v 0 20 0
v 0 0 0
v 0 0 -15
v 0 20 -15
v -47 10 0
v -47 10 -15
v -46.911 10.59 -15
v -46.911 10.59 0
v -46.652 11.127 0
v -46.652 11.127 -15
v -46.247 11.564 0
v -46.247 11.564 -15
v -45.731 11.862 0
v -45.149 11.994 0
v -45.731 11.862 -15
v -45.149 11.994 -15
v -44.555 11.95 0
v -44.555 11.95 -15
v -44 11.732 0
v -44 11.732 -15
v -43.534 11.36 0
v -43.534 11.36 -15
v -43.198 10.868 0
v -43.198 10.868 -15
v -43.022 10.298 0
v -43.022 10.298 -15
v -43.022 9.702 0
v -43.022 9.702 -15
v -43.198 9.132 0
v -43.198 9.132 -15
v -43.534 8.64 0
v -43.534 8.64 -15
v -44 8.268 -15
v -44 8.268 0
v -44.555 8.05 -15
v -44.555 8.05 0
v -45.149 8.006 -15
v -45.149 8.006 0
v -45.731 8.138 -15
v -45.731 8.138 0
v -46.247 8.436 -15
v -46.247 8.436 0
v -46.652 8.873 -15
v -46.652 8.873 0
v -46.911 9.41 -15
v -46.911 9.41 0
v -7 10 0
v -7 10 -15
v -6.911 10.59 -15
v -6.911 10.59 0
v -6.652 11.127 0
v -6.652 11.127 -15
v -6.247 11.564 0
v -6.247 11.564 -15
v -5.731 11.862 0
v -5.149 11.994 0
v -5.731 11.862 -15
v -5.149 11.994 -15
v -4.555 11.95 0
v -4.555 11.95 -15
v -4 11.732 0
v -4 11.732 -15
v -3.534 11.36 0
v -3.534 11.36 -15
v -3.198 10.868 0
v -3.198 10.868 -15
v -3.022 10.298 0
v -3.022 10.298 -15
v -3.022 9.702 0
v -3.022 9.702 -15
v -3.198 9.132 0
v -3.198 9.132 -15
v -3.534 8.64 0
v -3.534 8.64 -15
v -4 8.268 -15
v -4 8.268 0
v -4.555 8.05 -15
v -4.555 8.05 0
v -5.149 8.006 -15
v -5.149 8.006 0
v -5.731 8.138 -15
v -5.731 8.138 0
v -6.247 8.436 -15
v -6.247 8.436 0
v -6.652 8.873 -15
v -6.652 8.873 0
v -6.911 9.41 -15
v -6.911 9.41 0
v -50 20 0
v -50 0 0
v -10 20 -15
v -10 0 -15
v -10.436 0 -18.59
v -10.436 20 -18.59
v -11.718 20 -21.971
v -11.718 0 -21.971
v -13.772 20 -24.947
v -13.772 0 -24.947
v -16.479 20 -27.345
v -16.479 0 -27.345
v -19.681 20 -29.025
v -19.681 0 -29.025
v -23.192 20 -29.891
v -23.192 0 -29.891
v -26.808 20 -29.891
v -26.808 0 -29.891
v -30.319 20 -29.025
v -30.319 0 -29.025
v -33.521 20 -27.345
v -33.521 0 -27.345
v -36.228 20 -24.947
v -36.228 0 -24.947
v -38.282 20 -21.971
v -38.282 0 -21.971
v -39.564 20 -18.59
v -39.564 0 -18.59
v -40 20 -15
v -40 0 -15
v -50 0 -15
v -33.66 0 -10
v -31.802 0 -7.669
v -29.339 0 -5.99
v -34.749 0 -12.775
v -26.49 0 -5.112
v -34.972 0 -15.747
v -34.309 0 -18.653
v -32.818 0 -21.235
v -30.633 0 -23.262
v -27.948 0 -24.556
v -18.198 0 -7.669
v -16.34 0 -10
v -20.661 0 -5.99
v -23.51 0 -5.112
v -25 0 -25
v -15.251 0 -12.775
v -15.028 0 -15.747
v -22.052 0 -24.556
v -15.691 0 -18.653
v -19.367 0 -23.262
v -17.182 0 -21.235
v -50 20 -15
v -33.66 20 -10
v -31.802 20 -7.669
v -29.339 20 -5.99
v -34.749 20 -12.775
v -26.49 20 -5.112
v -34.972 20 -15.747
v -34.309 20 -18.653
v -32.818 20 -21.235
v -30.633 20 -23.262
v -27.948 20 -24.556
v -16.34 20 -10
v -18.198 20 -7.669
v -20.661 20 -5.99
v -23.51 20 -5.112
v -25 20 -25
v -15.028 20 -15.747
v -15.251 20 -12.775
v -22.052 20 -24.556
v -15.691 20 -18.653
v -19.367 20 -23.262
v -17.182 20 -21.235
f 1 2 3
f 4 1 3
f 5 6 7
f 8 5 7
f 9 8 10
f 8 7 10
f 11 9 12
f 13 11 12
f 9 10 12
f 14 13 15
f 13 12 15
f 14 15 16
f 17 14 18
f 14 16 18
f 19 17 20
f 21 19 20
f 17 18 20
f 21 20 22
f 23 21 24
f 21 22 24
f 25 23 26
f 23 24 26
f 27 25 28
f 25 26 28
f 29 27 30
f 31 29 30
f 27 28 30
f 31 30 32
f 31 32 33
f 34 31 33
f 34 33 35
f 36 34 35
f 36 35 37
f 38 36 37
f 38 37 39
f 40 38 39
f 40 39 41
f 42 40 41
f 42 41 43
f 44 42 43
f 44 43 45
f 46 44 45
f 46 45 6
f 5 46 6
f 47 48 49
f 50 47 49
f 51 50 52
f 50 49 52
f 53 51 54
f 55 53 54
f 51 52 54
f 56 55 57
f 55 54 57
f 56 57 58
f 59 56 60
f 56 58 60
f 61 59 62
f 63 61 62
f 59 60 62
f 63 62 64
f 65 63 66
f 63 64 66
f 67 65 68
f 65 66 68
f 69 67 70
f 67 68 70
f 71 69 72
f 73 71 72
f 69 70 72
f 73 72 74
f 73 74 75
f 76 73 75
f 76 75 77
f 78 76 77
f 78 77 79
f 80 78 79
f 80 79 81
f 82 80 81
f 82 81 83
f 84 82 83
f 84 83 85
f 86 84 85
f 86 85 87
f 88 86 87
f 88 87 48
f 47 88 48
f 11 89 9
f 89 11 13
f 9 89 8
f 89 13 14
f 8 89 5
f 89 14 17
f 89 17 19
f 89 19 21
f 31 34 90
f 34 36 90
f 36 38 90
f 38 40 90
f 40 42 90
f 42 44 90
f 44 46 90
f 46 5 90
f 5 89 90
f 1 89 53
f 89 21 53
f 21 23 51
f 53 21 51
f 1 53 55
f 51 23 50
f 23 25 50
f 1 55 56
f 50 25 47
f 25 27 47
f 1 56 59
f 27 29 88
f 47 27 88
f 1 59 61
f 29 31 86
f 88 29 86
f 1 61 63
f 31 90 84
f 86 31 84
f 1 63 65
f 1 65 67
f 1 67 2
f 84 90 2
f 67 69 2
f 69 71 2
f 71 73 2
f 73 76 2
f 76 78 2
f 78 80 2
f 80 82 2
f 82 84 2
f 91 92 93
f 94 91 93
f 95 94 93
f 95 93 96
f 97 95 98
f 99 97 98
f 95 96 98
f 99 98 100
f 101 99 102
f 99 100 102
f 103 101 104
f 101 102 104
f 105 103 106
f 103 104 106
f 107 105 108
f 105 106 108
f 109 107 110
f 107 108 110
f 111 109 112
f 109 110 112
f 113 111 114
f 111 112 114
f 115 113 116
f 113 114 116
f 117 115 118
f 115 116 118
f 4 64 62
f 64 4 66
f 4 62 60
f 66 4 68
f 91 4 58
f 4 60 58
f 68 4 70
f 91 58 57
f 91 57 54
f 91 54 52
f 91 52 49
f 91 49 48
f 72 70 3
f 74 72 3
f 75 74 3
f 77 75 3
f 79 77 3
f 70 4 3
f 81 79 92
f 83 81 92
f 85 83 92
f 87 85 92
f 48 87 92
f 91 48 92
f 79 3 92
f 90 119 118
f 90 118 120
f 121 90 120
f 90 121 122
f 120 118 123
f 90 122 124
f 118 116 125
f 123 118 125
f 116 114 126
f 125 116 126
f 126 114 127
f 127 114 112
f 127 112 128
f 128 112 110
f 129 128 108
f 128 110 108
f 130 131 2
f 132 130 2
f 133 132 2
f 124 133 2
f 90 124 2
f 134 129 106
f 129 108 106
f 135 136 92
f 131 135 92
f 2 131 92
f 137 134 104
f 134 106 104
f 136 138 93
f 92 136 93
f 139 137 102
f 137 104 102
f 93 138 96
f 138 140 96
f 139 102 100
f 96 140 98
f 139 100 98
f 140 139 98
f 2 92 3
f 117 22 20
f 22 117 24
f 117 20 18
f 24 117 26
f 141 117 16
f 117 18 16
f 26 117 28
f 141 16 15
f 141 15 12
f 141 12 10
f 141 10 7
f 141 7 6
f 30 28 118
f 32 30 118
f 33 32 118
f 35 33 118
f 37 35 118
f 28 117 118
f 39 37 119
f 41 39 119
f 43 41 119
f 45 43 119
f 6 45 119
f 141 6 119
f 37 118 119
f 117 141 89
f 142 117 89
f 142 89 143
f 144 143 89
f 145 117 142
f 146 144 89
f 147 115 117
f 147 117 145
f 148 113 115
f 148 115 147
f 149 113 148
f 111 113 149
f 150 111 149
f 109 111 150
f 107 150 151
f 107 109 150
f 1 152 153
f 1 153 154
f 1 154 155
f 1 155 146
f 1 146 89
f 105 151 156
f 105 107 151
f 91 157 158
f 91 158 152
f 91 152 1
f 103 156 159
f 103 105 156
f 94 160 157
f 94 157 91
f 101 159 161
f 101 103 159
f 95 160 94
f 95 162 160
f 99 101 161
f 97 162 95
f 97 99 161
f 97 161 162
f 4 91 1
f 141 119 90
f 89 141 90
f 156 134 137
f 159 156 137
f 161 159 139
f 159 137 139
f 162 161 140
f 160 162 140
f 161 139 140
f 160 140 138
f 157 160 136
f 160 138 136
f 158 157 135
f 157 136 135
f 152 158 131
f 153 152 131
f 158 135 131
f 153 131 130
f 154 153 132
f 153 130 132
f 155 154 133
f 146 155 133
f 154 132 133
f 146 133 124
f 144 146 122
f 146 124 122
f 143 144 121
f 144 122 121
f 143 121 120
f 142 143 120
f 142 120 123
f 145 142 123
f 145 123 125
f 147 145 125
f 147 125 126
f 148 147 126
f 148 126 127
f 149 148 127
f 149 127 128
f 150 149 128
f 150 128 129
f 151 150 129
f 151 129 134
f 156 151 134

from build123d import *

# Parameters (mm, degrees)
BOSS_EXTRUDE1_DEPTH = 20
SKETCH3_R           = 10
CUT_EXTRUDE1_DEPTH  = 62.64414003
SKETCH4_R           = 2
CUT_EXTRUDE2_DEPTH  = 56.901699437


with BuildPart() as part:
    # Sketch2 → Boss-Extrude1 (new body)
    with BuildSketch(Plane(origin=(0, 0, 0), x_dir=(1, 0, 0), z_dir=(0, 1, 0))):
        with BuildLine():
            Line((-50, 0), (0, 0))
            Line((0, 0), (0, 15))
            Line((0, 15), (-10, 15))
            ThreePointArc((-10, 15), (-25, 30), (-40, 15))
            Line((-40, 15), (-50, 15))
            Line((-50, 15), (-50, 0))
        make_face()
    extrude(amount=BOSS_EXTRUDE1_DEPTH)

    # Sketch3 → Cut-Extrude1 (cut, through all)
    with BuildSketch(Plane(origin=(0, 0, 0), x_dir=(-1, 0, 0), z_dir=(0, -1, 0))):
        with Locations(Location((25, 15, 0), (0, 0, 90))):
            Circle(SKETCH3_R)
    extrude(amount=-CUT_EXTRUDE1_DEPTH, mode=Mode.SUBTRACT)

    # Sketch4 → Cut-Extrude2 (cut, through all)
    with BuildSketch(Plane(origin=(0, 0, -15), x_dir=(-1, 0, 0), z_dir=(0, 0, -1))):
        with Locations((45, 10)):
            Circle(SKETCH4_R)
        with Locations((5, 10)):
            Circle(SKETCH4_R)
    extrude(amount=-CUT_EXTRUDE2_DEPTH, mode=Mode.SUBTRACT)


solid = part.part
